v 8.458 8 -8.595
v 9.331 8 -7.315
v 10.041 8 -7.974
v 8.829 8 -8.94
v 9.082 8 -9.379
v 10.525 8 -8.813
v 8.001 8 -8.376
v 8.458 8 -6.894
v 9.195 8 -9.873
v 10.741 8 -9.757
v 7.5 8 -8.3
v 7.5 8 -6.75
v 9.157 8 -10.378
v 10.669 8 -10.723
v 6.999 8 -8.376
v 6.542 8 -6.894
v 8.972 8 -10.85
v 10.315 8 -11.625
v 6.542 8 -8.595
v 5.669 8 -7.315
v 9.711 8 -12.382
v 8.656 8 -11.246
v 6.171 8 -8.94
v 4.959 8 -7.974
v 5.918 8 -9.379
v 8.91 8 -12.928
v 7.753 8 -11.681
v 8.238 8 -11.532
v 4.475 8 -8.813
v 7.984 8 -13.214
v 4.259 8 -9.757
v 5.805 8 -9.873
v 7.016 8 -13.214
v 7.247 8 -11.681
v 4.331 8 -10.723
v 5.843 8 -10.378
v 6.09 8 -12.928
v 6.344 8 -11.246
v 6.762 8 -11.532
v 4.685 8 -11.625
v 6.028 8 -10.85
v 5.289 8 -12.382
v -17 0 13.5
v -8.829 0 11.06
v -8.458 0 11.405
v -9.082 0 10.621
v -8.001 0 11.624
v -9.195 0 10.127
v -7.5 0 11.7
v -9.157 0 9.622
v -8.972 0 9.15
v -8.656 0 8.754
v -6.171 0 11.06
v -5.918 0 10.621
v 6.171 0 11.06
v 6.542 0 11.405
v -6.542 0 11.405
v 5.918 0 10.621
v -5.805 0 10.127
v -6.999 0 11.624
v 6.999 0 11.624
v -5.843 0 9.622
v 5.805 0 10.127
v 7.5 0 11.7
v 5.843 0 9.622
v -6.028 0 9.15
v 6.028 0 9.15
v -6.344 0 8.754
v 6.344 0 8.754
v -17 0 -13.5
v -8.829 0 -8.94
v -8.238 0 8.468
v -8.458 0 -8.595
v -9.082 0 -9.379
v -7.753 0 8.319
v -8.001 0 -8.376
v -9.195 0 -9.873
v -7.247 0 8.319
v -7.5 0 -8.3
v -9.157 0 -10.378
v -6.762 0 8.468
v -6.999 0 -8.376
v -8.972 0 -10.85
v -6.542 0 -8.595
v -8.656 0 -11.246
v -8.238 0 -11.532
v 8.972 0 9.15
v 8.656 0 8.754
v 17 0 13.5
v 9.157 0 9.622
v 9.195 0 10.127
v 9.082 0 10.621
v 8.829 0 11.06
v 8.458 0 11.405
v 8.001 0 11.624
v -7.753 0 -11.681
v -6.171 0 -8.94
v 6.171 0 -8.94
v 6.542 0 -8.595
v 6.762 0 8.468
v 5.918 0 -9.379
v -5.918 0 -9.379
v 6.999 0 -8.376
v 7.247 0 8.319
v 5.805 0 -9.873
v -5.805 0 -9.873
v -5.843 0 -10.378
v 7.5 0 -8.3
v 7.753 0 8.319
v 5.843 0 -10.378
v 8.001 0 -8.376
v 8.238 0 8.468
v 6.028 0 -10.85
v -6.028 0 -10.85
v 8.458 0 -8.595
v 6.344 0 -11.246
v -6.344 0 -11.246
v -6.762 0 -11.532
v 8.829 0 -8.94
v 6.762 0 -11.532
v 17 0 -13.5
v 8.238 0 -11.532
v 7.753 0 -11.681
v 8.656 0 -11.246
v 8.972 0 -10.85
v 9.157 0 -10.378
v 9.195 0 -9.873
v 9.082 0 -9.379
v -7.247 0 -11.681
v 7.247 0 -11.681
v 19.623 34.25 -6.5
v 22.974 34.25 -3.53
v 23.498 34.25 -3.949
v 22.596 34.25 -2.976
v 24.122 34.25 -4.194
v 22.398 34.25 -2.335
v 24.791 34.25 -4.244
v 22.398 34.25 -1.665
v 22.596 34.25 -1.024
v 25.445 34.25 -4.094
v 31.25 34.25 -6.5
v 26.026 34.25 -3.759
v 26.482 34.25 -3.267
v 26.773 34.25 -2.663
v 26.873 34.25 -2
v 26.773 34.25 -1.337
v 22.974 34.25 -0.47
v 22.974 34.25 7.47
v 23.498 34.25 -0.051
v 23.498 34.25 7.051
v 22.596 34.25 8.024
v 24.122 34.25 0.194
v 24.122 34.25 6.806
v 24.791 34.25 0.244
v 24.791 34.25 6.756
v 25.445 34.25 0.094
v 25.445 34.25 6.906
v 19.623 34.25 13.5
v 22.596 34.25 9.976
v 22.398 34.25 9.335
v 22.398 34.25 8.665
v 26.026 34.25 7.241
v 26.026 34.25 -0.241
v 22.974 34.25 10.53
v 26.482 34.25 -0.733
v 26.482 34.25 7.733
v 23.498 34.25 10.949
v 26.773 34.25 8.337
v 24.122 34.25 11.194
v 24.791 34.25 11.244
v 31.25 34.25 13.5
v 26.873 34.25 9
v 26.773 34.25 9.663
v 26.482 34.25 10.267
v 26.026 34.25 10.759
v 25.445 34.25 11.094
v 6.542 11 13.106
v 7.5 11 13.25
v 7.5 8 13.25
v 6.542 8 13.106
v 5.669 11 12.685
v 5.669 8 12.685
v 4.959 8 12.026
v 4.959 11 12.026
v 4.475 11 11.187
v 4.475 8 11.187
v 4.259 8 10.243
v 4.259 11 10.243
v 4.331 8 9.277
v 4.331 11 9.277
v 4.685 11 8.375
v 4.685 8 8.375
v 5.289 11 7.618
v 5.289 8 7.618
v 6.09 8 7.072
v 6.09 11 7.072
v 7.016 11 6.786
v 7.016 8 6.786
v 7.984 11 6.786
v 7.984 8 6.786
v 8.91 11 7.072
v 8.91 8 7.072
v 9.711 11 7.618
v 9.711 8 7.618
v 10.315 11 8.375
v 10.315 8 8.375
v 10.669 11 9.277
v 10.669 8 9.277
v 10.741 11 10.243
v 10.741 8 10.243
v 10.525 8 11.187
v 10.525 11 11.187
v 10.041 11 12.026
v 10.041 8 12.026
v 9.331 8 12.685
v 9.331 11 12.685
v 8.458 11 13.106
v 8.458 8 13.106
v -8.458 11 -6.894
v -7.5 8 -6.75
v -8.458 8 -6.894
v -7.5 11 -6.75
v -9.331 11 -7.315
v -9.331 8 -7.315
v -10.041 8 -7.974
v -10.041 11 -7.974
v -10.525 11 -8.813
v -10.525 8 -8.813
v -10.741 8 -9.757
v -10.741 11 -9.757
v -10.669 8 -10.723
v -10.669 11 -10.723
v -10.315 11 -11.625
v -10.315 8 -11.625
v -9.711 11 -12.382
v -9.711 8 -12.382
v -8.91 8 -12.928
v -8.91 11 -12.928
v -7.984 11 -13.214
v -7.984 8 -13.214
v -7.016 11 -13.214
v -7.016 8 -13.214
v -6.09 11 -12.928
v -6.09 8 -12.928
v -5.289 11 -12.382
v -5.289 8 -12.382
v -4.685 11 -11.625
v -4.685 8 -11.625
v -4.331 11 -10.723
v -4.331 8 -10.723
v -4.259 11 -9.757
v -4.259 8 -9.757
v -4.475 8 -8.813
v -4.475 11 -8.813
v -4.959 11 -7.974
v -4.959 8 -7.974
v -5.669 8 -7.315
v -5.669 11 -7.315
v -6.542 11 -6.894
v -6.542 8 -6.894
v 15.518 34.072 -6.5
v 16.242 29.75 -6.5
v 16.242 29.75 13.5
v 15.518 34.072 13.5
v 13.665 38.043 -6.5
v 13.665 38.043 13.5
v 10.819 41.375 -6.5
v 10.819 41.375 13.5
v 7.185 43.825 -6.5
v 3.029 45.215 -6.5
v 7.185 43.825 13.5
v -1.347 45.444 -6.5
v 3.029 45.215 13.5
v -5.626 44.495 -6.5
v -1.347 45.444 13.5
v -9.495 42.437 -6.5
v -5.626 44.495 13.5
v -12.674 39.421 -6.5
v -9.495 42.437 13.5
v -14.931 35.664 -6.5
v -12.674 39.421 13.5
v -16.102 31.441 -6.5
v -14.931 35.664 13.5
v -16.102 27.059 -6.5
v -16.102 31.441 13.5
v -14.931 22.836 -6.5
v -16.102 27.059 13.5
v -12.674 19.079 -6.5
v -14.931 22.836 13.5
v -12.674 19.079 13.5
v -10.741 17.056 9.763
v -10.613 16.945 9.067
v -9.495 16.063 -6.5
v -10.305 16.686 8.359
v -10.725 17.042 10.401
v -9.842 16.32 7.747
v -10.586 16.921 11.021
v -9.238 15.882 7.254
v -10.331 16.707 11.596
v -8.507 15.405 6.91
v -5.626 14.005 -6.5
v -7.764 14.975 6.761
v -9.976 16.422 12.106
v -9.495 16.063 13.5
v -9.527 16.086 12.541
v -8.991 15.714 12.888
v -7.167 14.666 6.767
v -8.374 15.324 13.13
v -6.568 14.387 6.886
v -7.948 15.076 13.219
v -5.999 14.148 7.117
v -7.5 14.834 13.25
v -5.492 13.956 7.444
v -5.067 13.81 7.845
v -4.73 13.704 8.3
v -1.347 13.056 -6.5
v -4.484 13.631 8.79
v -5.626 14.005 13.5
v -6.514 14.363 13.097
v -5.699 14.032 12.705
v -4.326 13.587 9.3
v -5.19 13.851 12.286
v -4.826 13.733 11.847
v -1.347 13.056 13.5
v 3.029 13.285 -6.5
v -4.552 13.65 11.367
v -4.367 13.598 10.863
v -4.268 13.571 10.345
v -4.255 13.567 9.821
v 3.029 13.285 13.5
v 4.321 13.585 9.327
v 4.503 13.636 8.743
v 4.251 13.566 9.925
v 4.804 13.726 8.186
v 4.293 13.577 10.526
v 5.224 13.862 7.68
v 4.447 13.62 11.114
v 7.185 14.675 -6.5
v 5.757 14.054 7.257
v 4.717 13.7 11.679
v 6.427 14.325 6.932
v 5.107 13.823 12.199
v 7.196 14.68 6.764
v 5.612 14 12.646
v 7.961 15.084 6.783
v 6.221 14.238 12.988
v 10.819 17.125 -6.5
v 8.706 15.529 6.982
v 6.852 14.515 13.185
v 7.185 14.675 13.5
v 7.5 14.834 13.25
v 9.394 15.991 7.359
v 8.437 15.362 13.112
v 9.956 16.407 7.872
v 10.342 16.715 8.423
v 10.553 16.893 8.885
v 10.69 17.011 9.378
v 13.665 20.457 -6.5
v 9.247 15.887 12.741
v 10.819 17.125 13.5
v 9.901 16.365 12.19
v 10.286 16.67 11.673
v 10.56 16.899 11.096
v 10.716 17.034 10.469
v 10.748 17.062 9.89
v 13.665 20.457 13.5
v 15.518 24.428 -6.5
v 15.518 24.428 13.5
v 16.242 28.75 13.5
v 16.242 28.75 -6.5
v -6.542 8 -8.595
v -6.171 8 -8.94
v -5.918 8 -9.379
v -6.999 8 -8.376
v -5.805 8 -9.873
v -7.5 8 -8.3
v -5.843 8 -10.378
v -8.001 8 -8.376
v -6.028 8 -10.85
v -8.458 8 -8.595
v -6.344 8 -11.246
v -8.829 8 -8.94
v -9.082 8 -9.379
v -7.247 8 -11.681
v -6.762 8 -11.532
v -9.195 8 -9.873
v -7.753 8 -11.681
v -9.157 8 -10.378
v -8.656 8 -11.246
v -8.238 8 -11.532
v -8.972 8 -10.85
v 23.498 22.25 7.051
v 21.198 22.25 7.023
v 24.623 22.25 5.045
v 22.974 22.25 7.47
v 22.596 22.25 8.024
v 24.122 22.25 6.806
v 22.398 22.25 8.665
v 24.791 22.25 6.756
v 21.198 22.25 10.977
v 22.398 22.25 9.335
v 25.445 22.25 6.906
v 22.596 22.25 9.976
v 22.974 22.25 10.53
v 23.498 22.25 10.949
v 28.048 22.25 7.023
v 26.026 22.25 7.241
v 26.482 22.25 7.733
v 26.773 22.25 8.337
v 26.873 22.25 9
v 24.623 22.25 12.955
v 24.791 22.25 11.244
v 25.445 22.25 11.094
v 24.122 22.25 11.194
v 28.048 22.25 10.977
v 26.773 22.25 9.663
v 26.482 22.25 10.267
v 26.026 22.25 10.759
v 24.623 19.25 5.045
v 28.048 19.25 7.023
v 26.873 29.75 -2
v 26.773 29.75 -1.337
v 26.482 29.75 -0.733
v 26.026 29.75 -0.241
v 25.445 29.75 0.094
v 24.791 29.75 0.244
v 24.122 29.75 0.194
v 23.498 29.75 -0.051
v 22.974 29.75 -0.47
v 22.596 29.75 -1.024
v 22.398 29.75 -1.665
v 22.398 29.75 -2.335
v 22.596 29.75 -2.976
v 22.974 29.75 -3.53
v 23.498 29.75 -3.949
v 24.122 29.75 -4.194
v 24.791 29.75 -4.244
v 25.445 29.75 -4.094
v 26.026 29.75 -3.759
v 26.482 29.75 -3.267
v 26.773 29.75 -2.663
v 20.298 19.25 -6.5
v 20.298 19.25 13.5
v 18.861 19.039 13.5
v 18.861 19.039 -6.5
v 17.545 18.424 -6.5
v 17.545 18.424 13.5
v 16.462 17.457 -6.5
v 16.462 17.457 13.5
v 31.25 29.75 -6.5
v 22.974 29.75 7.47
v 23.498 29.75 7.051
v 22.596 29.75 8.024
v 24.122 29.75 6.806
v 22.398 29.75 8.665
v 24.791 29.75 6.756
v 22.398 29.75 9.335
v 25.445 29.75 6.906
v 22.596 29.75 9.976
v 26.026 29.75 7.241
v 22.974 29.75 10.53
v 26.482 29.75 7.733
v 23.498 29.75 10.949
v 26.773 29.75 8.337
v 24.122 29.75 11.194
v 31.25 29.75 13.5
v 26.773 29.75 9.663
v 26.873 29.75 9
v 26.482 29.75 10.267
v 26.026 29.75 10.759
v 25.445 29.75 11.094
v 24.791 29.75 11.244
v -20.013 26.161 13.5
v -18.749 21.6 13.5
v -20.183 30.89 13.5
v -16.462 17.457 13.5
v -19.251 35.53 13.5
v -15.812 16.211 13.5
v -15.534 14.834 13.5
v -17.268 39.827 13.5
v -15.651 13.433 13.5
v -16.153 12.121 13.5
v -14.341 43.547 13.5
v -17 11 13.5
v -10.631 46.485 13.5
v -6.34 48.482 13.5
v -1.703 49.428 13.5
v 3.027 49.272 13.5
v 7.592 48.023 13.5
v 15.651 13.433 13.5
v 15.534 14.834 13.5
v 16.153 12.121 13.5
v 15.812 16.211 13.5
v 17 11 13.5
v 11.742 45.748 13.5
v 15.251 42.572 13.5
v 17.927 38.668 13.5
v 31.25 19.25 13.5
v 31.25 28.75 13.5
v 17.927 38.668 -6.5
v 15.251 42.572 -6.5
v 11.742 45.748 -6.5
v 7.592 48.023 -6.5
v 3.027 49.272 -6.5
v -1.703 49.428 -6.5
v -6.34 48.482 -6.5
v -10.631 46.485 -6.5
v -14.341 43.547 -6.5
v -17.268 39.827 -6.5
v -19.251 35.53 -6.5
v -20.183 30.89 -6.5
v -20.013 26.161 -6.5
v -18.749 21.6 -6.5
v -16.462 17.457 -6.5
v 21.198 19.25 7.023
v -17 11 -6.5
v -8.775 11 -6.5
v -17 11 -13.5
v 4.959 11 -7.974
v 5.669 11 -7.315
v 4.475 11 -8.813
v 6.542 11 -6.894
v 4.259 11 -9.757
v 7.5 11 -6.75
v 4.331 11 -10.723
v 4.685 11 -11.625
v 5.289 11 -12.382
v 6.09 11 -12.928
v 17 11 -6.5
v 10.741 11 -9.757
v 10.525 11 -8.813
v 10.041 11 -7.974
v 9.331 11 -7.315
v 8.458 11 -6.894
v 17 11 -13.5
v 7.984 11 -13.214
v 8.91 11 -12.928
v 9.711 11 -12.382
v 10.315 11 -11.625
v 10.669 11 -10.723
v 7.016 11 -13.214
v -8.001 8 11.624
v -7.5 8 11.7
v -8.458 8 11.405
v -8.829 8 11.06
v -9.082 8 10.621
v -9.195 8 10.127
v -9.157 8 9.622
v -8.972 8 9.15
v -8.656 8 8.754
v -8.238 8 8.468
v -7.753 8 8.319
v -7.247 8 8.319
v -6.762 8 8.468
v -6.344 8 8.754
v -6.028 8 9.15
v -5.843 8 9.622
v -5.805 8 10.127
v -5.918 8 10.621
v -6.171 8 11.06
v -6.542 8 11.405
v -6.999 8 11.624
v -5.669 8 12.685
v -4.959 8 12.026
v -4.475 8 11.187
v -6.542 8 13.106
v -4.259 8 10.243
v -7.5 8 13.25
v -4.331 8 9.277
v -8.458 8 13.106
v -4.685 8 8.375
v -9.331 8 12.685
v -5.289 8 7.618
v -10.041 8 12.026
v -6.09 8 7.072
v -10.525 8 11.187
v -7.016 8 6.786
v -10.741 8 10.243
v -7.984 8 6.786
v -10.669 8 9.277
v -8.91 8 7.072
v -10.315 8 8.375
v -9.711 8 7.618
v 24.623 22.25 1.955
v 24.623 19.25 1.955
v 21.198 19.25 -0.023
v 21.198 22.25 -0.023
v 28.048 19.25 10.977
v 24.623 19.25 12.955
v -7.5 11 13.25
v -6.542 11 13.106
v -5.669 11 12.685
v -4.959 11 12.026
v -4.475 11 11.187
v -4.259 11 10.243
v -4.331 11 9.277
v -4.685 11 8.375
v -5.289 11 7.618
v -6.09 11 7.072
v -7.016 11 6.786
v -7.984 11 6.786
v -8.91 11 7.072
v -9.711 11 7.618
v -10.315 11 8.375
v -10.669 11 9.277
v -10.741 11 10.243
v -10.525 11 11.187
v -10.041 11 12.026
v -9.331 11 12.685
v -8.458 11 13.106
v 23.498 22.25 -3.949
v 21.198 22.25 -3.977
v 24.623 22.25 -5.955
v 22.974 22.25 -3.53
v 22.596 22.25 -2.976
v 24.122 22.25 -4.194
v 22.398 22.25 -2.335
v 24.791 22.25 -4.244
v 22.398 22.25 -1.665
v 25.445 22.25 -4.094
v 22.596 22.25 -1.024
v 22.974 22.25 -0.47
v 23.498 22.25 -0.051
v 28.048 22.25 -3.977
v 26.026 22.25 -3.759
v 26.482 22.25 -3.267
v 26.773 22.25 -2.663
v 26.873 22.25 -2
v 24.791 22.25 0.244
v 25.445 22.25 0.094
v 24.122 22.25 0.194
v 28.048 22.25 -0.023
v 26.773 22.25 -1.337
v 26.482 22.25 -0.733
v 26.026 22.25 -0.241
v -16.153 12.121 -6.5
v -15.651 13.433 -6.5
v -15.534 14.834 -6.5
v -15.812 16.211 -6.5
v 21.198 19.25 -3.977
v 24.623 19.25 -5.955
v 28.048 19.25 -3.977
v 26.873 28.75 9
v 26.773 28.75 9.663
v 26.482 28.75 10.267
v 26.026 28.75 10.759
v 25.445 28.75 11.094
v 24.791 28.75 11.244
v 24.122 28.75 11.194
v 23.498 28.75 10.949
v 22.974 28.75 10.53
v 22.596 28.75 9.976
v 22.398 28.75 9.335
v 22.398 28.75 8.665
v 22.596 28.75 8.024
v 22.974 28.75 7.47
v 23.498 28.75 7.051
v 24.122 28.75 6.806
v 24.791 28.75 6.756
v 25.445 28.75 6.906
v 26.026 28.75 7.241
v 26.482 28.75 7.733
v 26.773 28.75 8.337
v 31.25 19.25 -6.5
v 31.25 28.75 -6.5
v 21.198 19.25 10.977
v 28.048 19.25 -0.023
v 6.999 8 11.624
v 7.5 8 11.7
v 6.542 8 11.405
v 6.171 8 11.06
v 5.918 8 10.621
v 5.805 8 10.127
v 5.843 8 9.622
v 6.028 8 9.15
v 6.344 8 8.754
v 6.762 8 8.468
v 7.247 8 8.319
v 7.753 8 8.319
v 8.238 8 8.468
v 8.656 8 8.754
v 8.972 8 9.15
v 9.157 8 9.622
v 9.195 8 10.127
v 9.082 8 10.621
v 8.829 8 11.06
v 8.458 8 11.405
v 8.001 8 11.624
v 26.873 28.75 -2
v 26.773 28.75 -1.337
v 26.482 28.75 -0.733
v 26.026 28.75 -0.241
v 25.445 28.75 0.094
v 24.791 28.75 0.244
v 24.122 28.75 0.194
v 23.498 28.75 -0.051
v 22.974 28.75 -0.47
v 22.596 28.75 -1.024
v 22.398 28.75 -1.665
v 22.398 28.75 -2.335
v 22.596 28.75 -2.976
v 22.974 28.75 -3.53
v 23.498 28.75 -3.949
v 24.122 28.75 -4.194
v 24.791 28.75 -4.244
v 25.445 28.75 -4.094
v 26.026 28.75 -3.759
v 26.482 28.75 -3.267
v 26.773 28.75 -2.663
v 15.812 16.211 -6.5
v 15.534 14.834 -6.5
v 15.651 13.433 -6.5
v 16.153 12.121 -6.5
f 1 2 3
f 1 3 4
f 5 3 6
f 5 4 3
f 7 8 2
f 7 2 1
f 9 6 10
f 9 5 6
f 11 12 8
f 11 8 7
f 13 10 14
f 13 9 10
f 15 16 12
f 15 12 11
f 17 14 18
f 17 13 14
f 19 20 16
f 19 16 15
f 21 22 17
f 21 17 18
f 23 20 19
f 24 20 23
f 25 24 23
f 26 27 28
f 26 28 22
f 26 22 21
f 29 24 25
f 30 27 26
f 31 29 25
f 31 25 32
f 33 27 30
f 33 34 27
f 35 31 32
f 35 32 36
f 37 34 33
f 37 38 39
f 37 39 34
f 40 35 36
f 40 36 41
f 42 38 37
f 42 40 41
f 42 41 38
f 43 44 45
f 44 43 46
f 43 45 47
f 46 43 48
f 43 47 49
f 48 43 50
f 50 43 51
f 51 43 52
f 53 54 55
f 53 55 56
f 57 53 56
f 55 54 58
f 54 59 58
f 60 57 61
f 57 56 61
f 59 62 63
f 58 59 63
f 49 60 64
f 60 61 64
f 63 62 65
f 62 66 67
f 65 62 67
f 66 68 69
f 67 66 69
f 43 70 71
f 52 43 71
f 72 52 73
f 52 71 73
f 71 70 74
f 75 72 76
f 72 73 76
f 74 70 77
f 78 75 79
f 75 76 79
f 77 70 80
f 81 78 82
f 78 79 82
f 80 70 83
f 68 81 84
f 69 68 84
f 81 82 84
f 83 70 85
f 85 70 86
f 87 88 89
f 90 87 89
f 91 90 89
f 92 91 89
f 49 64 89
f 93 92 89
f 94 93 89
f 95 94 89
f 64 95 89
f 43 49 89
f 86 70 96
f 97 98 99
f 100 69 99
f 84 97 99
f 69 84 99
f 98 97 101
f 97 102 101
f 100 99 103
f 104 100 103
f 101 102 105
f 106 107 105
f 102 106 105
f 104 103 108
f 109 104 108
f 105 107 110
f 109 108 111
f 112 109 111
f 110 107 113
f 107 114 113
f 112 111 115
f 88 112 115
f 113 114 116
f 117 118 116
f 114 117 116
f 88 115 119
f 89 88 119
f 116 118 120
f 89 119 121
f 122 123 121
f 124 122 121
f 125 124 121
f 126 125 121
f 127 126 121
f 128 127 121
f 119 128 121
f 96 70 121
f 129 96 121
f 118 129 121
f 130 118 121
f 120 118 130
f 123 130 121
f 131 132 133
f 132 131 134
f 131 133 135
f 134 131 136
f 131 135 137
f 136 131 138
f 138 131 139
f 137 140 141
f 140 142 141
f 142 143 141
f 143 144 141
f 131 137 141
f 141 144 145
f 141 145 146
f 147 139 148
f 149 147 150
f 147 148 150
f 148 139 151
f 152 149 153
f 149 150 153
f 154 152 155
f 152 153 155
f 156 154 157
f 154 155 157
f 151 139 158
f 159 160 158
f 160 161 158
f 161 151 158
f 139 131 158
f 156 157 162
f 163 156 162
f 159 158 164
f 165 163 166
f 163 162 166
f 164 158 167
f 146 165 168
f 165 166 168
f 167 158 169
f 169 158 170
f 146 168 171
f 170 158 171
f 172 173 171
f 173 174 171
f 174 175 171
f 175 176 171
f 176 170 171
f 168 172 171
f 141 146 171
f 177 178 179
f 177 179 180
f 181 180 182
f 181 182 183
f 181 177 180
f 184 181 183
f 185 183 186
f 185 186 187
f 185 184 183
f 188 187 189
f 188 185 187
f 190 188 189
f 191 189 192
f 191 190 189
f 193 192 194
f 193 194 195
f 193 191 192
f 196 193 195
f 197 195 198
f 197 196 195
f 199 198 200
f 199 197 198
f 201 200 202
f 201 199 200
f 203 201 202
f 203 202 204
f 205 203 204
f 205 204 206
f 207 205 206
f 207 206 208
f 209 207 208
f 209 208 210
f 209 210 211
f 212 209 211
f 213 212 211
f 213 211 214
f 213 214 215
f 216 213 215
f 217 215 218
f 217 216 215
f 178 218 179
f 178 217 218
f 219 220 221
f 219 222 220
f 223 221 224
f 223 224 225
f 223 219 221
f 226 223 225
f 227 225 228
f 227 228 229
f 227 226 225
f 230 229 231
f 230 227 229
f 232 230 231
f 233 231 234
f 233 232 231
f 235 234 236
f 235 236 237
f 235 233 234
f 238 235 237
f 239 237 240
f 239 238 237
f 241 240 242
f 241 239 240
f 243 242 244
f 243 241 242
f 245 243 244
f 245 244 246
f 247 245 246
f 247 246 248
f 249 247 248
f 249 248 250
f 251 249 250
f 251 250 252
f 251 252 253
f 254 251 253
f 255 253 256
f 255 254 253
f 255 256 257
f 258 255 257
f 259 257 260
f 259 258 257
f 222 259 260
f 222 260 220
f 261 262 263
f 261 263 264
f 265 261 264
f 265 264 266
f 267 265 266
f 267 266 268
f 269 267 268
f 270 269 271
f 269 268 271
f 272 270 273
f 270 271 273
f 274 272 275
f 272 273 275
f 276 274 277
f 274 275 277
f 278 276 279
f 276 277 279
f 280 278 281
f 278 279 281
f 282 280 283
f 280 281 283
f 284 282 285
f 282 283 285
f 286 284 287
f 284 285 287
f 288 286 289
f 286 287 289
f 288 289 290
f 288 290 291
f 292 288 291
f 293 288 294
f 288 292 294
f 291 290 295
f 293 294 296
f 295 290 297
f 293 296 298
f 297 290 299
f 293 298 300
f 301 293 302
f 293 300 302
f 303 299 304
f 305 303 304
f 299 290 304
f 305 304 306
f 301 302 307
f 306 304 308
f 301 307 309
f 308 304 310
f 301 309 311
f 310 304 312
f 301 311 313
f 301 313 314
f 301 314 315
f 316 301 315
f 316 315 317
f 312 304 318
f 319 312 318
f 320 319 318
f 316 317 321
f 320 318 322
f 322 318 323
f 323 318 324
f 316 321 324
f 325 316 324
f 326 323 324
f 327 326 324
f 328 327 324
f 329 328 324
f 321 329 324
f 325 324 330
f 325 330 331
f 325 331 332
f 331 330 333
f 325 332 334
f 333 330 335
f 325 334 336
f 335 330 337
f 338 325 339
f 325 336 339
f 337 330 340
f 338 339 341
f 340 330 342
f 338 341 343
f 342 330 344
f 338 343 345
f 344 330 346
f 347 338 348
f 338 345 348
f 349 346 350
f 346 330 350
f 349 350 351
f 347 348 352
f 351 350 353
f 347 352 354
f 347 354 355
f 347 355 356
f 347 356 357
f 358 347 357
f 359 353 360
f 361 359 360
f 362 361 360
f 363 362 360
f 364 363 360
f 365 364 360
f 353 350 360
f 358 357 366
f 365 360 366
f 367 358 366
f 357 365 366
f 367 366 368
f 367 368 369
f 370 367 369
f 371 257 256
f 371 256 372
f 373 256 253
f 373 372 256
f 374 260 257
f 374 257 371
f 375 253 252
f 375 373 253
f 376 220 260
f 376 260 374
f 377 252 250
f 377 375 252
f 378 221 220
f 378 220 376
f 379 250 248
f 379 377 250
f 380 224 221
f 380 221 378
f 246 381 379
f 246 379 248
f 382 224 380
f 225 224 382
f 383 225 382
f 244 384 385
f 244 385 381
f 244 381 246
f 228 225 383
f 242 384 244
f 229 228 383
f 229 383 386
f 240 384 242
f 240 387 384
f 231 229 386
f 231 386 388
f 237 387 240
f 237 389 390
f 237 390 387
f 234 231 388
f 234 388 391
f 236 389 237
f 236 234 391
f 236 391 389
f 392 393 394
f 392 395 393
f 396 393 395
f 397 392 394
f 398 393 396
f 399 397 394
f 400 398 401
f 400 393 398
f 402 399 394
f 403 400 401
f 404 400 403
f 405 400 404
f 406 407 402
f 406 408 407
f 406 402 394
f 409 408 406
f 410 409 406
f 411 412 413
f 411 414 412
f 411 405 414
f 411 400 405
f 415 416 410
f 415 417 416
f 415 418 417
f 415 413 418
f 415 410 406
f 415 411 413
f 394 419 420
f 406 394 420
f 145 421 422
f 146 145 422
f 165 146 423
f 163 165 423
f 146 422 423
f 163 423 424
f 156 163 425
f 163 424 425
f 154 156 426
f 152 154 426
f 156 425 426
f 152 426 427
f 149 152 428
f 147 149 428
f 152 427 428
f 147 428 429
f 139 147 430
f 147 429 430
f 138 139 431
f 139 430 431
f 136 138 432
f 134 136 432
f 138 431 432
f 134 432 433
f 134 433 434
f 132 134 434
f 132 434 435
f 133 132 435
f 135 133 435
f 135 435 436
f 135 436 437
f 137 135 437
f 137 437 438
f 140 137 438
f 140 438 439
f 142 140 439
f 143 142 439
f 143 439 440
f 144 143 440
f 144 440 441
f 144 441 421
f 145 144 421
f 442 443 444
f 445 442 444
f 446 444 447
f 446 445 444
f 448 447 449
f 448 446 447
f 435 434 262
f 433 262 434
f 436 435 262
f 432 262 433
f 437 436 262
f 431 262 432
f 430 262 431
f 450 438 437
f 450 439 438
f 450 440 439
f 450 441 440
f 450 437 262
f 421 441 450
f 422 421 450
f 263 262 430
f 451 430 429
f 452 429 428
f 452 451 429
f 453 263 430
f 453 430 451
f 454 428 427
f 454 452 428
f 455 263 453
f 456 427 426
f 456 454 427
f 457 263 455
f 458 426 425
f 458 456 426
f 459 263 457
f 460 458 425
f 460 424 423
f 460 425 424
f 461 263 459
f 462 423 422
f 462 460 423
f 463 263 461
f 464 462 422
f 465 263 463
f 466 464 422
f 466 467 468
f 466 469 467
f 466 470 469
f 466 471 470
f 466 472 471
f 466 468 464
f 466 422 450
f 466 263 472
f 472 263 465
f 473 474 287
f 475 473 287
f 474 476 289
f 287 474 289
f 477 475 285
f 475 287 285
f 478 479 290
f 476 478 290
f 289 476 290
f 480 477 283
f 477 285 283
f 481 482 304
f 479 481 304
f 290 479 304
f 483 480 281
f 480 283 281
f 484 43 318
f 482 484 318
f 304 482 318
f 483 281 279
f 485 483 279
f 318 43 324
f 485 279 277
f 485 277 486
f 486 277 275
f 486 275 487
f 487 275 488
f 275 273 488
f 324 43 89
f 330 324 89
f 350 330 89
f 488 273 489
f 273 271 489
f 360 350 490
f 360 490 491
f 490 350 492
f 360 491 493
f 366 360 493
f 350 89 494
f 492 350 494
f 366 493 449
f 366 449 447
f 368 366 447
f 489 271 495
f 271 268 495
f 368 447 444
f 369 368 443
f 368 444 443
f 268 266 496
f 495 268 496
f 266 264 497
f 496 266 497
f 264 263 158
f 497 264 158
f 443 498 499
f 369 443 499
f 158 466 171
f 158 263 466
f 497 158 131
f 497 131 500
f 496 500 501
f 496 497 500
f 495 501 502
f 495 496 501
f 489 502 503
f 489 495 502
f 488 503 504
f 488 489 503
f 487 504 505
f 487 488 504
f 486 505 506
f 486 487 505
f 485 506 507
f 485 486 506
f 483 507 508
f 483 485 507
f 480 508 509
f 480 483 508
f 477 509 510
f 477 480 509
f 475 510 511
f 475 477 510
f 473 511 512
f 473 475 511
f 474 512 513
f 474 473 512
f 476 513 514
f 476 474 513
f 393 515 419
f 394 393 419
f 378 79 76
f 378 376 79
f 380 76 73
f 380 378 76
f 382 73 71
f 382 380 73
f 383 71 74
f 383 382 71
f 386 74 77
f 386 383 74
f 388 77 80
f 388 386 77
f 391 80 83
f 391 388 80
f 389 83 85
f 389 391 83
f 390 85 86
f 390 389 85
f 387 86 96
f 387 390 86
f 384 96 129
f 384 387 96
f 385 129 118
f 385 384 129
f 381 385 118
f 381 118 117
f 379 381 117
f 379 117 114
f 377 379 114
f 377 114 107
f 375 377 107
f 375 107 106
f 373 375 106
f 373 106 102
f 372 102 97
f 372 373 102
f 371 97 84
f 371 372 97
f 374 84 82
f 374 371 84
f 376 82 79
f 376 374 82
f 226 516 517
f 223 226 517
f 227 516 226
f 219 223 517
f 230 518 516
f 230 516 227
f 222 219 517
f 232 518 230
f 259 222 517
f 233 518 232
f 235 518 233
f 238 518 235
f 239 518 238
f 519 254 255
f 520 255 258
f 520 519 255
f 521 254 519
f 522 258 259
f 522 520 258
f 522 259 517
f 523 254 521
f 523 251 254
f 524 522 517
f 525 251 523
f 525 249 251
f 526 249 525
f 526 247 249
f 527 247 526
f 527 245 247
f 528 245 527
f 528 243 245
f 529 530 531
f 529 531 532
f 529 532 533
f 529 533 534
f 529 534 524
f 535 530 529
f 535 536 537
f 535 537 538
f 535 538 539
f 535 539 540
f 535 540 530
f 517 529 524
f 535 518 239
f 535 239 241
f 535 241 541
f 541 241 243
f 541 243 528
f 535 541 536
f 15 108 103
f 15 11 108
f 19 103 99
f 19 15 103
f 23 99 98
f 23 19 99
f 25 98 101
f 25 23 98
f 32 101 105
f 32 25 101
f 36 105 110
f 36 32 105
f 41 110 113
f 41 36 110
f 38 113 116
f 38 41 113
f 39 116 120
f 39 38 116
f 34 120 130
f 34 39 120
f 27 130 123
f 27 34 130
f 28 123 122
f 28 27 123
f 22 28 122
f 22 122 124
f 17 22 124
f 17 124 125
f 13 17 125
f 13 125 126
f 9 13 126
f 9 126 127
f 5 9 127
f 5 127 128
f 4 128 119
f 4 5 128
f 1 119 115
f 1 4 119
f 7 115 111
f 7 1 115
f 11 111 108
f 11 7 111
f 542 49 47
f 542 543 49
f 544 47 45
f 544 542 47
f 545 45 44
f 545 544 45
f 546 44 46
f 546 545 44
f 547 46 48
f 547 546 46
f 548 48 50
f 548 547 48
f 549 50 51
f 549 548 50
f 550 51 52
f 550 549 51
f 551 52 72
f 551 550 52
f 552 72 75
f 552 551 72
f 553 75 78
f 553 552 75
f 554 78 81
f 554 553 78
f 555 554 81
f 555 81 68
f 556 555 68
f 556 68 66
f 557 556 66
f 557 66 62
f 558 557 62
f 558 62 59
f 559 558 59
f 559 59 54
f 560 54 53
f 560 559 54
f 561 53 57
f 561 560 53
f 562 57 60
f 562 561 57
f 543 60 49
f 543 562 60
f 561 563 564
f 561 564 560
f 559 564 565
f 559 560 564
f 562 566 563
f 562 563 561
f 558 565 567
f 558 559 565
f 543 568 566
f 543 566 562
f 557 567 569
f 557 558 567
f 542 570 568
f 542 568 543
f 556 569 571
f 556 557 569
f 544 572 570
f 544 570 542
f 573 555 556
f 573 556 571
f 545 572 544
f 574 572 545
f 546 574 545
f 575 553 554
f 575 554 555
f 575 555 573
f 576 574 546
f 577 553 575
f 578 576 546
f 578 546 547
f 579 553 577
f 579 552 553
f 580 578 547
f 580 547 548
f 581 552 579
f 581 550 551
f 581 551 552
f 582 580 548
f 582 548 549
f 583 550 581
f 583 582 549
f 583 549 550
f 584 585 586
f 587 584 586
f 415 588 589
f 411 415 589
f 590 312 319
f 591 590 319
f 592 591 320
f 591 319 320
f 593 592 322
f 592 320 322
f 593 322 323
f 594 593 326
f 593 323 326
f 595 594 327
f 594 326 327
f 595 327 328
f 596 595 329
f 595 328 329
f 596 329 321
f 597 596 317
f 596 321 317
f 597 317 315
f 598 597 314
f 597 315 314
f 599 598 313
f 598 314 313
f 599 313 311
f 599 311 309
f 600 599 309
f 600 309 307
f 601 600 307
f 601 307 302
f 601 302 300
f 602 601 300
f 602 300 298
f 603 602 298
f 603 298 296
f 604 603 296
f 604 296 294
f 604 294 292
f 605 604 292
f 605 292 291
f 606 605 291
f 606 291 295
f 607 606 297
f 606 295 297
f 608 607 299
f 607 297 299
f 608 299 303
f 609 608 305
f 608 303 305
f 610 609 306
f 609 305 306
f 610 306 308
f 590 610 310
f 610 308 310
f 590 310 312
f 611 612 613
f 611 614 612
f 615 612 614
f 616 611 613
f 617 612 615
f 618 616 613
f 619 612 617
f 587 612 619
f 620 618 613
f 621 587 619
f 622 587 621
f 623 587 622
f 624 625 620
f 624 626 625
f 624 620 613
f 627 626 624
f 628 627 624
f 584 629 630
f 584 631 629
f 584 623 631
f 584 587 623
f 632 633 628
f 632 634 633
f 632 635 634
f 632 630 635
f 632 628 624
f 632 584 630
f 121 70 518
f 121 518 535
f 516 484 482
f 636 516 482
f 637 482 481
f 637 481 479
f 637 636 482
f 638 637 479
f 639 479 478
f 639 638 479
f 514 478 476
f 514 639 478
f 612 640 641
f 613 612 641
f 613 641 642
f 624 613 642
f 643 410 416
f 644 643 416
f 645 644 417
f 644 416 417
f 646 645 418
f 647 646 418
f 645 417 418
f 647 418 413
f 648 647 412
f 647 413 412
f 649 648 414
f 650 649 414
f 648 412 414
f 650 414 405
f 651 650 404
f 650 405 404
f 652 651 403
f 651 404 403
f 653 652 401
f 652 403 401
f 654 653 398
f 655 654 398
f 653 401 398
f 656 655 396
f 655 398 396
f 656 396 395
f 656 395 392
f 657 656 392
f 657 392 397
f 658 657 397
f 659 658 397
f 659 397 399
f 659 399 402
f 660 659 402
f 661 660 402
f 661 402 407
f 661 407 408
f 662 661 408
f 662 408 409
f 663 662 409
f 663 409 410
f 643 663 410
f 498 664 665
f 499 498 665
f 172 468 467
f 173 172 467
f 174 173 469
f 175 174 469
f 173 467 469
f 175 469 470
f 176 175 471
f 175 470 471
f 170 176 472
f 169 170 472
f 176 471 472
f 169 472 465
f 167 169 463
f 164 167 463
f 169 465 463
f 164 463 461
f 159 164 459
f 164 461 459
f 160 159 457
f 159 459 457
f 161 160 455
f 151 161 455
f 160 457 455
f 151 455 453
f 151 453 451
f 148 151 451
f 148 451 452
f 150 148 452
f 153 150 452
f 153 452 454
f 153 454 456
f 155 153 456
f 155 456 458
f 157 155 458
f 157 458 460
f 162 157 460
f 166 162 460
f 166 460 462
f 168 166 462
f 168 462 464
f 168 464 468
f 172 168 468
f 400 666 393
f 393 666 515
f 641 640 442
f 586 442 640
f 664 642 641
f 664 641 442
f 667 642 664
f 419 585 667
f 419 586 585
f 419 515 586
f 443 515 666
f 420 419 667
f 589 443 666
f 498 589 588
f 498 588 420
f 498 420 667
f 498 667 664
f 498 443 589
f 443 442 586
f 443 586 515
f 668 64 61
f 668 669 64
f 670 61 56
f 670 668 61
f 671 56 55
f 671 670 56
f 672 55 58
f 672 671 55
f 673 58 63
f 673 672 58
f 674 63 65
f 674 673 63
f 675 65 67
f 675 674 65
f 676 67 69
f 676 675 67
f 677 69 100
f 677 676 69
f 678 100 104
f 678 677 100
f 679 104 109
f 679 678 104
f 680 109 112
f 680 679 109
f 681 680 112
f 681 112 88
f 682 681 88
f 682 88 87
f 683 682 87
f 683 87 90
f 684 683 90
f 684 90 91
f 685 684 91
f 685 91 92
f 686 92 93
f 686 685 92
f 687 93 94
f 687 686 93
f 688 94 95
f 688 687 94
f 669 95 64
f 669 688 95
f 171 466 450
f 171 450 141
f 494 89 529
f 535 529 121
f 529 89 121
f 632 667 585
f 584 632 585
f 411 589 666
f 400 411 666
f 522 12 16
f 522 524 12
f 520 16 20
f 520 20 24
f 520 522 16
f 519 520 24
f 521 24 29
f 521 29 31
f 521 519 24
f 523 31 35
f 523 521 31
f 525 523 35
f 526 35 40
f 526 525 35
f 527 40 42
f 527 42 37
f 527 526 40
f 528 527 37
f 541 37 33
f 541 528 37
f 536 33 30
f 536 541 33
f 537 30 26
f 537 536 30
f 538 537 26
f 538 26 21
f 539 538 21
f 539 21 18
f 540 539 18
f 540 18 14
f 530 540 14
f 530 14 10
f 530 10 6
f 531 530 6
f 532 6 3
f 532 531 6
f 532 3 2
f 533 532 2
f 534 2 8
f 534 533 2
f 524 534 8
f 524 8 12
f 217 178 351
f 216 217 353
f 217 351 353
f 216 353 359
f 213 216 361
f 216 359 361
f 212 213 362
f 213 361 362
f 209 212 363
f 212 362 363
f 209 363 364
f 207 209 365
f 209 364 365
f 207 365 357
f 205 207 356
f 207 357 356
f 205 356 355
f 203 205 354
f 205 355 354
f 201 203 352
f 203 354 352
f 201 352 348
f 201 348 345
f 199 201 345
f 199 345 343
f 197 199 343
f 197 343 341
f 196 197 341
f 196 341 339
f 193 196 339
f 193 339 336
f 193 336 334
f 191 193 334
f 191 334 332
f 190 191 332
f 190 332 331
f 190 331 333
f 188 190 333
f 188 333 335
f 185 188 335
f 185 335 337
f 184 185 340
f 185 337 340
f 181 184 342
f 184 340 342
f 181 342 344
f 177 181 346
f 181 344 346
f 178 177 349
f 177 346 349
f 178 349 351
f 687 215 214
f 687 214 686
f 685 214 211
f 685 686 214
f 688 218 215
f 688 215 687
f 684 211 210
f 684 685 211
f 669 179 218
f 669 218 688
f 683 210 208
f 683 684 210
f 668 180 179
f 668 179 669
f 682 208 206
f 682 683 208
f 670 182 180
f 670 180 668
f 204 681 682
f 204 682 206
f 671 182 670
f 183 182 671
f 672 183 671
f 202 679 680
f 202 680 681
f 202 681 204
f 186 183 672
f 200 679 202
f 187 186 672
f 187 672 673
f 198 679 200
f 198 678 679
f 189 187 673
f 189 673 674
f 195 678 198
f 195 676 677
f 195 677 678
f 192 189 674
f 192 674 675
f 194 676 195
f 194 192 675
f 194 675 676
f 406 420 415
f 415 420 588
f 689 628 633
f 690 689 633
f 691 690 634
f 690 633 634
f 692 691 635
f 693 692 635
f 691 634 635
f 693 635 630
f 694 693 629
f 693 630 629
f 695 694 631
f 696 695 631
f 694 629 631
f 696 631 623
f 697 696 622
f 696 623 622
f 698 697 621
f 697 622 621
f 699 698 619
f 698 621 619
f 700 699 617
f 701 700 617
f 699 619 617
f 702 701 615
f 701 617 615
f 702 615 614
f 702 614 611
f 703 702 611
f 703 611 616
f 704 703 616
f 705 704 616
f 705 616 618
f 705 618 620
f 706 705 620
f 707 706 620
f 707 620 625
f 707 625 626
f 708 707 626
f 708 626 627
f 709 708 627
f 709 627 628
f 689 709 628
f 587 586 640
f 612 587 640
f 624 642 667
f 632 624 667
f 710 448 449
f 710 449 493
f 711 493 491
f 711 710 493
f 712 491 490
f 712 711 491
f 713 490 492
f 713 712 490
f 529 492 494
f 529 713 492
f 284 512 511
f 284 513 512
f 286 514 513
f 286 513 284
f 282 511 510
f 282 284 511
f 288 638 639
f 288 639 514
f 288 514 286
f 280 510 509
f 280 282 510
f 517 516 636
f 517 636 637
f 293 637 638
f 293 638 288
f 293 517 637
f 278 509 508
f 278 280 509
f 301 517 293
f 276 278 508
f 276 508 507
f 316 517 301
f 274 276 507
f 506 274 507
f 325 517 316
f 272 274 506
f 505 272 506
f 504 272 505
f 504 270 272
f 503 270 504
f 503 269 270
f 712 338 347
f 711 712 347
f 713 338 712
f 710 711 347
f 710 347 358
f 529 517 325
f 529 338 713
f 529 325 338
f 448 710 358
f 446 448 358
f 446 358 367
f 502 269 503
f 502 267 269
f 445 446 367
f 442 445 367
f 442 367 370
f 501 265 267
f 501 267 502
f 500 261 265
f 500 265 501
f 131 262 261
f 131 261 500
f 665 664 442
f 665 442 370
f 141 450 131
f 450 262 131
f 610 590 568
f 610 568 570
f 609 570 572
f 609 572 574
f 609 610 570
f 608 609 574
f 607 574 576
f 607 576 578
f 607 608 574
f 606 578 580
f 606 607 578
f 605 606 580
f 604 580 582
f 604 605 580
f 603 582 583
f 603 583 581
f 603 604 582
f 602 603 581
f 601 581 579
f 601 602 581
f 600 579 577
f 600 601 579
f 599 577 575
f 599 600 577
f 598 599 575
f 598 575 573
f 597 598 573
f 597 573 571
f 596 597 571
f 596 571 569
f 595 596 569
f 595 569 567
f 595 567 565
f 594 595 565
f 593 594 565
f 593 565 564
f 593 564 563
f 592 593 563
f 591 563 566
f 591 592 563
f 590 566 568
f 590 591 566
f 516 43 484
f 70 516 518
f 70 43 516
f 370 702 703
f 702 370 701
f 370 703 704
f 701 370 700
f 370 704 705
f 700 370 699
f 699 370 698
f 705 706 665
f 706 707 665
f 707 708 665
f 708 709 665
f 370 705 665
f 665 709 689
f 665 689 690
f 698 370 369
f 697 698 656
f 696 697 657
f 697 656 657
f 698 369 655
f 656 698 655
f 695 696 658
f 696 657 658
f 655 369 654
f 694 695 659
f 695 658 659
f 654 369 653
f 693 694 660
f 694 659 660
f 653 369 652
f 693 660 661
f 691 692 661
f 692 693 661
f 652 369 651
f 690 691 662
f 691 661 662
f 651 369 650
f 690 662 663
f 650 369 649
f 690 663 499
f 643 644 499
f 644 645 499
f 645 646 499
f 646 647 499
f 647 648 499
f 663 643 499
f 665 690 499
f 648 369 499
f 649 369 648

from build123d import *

# Parameters (mm, degrees)
SKETCH1_W                     = 34
SKETCH1_H                     = 27
BOSS_EXTRUDE1_DEPTH           = 11
SKETCH2_R                     = 20.25
SKETCH2_R_2                   = 16.25
MOTOR_CLAMP_BAND_DEPTH        = 20
FILLET4_R                     = 5
SKETCH7_W                     = 15
SKETCH7_H                     = 15
BOSS_EXTRUDE3_DEPTH           = 20
FILLET5_R                     = 5
CBORE_FOR_M3_SHCS1_AT_2_COUNT = 2
CBORE_FOR_M3_SHCS1_AT_2_PITCH = 15
CBORE_FOR_M3_SHCS1_AT_3_COUNT = 2
CBORE_FOR_M3_SHCS1_AT_3_PITCH = 25
CBORE_FOR_M3_SHCS1_AT_4_COUNT = 2
CBORE_FOR_M3_SHCS1_AT_4_PITCH = 20
EXTENDED_START                = 15
SKETCH6_R                     = 3.25
EXTENDED_COUNTERBORE_1_DEPTH  = 15
M4_CLEARANCE_HOLE1_D          = 4.5
CUT_EXTRUDE2_DEPTH            = 3
SKETCH14_W                    = 15.007694129
SKETCH14_H                    = 1
CUT_EXTRUDE3_DEPTH            = 65.465591597
FILLET3_R                     = 5


with BuildPart() as part:
    # Sketch1 → Boss-Extrude1 (new body)
    with BuildSketch(Plane(origin=(0, 0, 0), x_dir=(1, 0, 0), z_dir=(0, 1, 0))):
        Rectangle(SKETCH1_W, SKETCH1_H)
    extrude(amount=BOSS_EXTRUDE1_DEPTH)

    # Sketch2 → Motor Clamp Band (add)
    with BuildSketch(Plane.XY.offset(13.5)):
        with Locations((0, 29.25)):
            Circle(SKETCH2_R)
        with Locations((0, 29.25)):
            Circle(SKETCH2_R_2, mode=Mode.SUBTRACT)
    extrude(amount=-MOTOR_CLAMP_BAND_DEPTH)

    # Fillet4
    # the kernel refuses this fillet: 5 mm, written as the material it adds along each edge
    with BuildSketch(Plane(origin=(8.774964387, 11, -6.5), x_dir=(0.7657018852259857, 0.6431956335061453, 0), z_dir=(0, 0, 1))) as fillet4_piece_1:
        with BuildLine():
            CenterArc((11.27796375, -4.843969922), FILLET4_R, 104.351347878, 80.770115484)
            Line((6.297925275, -5.290306991), (6.198324505, -5.299233733))
            ThreePointArc((6.198324505, -5.299233733), (3.084643074, -2.721723684), (-0.064319563, -0.076570189))
            Line((-0.064319563, -0.076570189), (0.024786734, 0.096879398))
            ThreePointArc((0.024786734, 0.096879398), (5.019313537, -0.531921816), (10.013840341, 0.096879398))
            Line((10.013840341, 0.096879398), (10.038627075, 0))
        make_face()
    extrude(amount=20)

    # Sketch7 → Boss-Extrude3 (add)
    with BuildSketch(Plane.XY.offset(13.5)):
        with Locations((23.75, 26.75)):
            Rectangle(SKETCH7_W, SKETCH7_H)
    extrude(amount=-BOSS_EXTRUDE3_DEPTH)

    # Fillet5
    # the kernel refuses this fillet: 5 mm, written as the material it adds along each edge
    with BuildSketch(Plane(origin=(-8.774964387, 11, -6.5), x_dir=(-1, 0, 0), z_dir=(0, 0, 1))) as fillet5_piece_1:
        with BuildLine():
            CenterArc((11.751178408, -3.544900138), FILLET5_R, 134.848011946, 80.770115484)
            Line((7.686595676, -6.456801101), (7.605304021, -6.51503912))
            ThreePointArc((7.605304021, -6.51503912), (4.185427628, -2.821107013), (-0.043333157, -0.090123457))
            Line((-0.043333157, -0.090123457), (0, 0.1))
            ThreePointArc((0, 0.1), (4.112517806, 0.1), (8.154512757, 0.070898003))
            Line((8.154512757, 0.070898003), (8.225035613, 0))
        make_face()
    extrude(amount=20)

    # Sketch4 → CBORE for M3 SHCS1 (revolve, cut)
    with BuildSketch(Plane(origin=(7.5, 11, -10), x_dir=(0, 0, 1), z_dir=(1, 0, 0))):
        Polygon((0, 0), (0, 11), (1.7, 11), (1.7, 3), (3.25, 3), (3.25, 0), align=None)
    cbore_for_m3_shcs1 = revolve(axis=Axis((7.5, 17.35, -10), (0, -1, 0)), mode=Mode.SUBTRACT)

    # CBORE for M3 SHCS1 at 2: CBORE for M3 SHCS1 ×2
    with Locations(*[(-i * CBORE_FOR_M3_SHCS1_AT_2_PITCH, 0, 0) for i in range(1, CBORE_FOR_M3_SHCS1_AT_2_COUNT)]):
        add(cbore_for_m3_shcs1, mode=Mode.SUBTRACT)

    # CBORE for M3 SHCS1 at 3: CBORE for M3 SHCS1 ×2
    with Locations(*[Vector(-0.5999999999999989, 0, 0.8000000000000009) * (i * CBORE_FOR_M3_SHCS1_AT_3_PITCH) for i in range(1, CBORE_FOR_M3_SHCS1_AT_3_COUNT)]):
        add(cbore_for_m3_shcs1, mode=Mode.SUBTRACT)

    # CBORE for M3 SHCS1 at 4: CBORE for M3 SHCS1 ×2
    with Locations(*[(0, 0, i * CBORE_FOR_M3_SHCS1_AT_4_PITCH) for i in range(1, CBORE_FOR_M3_SHCS1_AT_4_COUNT)]):
        add(cbore_for_m3_shcs1, mode=Mode.SUBTRACT)

    # Sketch6 → Extended CounterBore 1 (cut)
    with BuildSketch(Plane(origin=(0, 11, 0), x_dir=(1, 0, 0), z_dir=(0, 1, 0)).offset(EXTENDED_START)):
        with Locations(Location((7.5, -10, 0), (0, 0, 270))):
            Circle(SKETCH6_R)
        with Locations(Location((-7.5, -10, 0), (0, 0, 270))):
            Circle(SKETCH6_R)
    extrude(amount=-EXTENDED_COUNTERBORE_1_DEPTH, mode=Mode.SUBTRACT)

    # M4 Clearance Hole1 (through all)
    with Locations(Plane(origin=(0, 34.25, 0), x_dir=(-1, 0, 0), z_dir=(0, 1, 0))):
        with Locations((-24.623009453, -2), (-24.623009453, 9)):
            Hole(M4_CLEARANCE_HOLE1_D / 2)

    # Sketch13 → Cut-Extrude2 (cut)
    with BuildSketch(Plane.XZ.offset(-19.25)):
        Polygon((24.623009453, 12.954849344), (21.198009453, 10.977424672), (21.198009453, 7.022575328), (24.623009453, 5.045150656), (28.048009453, 7.022575328), (28.048009453, 10.977424672), align=None)
        Polygon((28.048009453, -0.022575328), (24.623009453, 1.954849344), (21.198009453, -0.022575328), (21.198009453, -3.977424672), (24.623009453, -5.954849344), (28.048009453, -3.977424672), align=None)
    extrude(amount=-CUT_EXTRUDE2_DEPTH, mode=Mode.SUBTRACT)

    # Sketch14 → Cut-Extrude3 (cut, through all)
    with BuildSketch(Plane.XY.offset(13.5)):
        with Locations((23.746152936, 29.25)):
            Rectangle(SKETCH14_W, SKETCH14_H)
    extrude(amount=-CUT_EXTRUDE3_DEPTH, mode=Mode.SUBTRACT)

    # Fillet3
    # the kernel refuses this fillet: 5 mm, written as the material it adds along each edge
    with BuildSketch(Plane(origin=(17.608591653, 19.25, -6.5), x_dir=(-0.5388484844645524, -0.8424027010820033, 0), z_dir=(0, 0, 1))) as fillet3_piece_1:
        with BuildLine():
            CenterArc((2.762959446, 4.959604744), FILLET3_R, 212.605284551, 50.106677373)
            Line((-1.44905406, 2.265362322), (-1.53329433, 2.211477474))
            Line((-1.53329433, 2.211477474), (-0.08424027, -0.053884848))
            Line((-0.08424027, -0.053884848), (0.00525598, -0.099861778))
            ThreePointArc((0.00525598, -0.099861778), (1.064335915, -0.072010015), (2.115986078, -0.099192095))
            Line((2.115986078, -0.099192095), (2.12867183, 0))
        make_face()
    extrude(amount=20)


solid = part.part
